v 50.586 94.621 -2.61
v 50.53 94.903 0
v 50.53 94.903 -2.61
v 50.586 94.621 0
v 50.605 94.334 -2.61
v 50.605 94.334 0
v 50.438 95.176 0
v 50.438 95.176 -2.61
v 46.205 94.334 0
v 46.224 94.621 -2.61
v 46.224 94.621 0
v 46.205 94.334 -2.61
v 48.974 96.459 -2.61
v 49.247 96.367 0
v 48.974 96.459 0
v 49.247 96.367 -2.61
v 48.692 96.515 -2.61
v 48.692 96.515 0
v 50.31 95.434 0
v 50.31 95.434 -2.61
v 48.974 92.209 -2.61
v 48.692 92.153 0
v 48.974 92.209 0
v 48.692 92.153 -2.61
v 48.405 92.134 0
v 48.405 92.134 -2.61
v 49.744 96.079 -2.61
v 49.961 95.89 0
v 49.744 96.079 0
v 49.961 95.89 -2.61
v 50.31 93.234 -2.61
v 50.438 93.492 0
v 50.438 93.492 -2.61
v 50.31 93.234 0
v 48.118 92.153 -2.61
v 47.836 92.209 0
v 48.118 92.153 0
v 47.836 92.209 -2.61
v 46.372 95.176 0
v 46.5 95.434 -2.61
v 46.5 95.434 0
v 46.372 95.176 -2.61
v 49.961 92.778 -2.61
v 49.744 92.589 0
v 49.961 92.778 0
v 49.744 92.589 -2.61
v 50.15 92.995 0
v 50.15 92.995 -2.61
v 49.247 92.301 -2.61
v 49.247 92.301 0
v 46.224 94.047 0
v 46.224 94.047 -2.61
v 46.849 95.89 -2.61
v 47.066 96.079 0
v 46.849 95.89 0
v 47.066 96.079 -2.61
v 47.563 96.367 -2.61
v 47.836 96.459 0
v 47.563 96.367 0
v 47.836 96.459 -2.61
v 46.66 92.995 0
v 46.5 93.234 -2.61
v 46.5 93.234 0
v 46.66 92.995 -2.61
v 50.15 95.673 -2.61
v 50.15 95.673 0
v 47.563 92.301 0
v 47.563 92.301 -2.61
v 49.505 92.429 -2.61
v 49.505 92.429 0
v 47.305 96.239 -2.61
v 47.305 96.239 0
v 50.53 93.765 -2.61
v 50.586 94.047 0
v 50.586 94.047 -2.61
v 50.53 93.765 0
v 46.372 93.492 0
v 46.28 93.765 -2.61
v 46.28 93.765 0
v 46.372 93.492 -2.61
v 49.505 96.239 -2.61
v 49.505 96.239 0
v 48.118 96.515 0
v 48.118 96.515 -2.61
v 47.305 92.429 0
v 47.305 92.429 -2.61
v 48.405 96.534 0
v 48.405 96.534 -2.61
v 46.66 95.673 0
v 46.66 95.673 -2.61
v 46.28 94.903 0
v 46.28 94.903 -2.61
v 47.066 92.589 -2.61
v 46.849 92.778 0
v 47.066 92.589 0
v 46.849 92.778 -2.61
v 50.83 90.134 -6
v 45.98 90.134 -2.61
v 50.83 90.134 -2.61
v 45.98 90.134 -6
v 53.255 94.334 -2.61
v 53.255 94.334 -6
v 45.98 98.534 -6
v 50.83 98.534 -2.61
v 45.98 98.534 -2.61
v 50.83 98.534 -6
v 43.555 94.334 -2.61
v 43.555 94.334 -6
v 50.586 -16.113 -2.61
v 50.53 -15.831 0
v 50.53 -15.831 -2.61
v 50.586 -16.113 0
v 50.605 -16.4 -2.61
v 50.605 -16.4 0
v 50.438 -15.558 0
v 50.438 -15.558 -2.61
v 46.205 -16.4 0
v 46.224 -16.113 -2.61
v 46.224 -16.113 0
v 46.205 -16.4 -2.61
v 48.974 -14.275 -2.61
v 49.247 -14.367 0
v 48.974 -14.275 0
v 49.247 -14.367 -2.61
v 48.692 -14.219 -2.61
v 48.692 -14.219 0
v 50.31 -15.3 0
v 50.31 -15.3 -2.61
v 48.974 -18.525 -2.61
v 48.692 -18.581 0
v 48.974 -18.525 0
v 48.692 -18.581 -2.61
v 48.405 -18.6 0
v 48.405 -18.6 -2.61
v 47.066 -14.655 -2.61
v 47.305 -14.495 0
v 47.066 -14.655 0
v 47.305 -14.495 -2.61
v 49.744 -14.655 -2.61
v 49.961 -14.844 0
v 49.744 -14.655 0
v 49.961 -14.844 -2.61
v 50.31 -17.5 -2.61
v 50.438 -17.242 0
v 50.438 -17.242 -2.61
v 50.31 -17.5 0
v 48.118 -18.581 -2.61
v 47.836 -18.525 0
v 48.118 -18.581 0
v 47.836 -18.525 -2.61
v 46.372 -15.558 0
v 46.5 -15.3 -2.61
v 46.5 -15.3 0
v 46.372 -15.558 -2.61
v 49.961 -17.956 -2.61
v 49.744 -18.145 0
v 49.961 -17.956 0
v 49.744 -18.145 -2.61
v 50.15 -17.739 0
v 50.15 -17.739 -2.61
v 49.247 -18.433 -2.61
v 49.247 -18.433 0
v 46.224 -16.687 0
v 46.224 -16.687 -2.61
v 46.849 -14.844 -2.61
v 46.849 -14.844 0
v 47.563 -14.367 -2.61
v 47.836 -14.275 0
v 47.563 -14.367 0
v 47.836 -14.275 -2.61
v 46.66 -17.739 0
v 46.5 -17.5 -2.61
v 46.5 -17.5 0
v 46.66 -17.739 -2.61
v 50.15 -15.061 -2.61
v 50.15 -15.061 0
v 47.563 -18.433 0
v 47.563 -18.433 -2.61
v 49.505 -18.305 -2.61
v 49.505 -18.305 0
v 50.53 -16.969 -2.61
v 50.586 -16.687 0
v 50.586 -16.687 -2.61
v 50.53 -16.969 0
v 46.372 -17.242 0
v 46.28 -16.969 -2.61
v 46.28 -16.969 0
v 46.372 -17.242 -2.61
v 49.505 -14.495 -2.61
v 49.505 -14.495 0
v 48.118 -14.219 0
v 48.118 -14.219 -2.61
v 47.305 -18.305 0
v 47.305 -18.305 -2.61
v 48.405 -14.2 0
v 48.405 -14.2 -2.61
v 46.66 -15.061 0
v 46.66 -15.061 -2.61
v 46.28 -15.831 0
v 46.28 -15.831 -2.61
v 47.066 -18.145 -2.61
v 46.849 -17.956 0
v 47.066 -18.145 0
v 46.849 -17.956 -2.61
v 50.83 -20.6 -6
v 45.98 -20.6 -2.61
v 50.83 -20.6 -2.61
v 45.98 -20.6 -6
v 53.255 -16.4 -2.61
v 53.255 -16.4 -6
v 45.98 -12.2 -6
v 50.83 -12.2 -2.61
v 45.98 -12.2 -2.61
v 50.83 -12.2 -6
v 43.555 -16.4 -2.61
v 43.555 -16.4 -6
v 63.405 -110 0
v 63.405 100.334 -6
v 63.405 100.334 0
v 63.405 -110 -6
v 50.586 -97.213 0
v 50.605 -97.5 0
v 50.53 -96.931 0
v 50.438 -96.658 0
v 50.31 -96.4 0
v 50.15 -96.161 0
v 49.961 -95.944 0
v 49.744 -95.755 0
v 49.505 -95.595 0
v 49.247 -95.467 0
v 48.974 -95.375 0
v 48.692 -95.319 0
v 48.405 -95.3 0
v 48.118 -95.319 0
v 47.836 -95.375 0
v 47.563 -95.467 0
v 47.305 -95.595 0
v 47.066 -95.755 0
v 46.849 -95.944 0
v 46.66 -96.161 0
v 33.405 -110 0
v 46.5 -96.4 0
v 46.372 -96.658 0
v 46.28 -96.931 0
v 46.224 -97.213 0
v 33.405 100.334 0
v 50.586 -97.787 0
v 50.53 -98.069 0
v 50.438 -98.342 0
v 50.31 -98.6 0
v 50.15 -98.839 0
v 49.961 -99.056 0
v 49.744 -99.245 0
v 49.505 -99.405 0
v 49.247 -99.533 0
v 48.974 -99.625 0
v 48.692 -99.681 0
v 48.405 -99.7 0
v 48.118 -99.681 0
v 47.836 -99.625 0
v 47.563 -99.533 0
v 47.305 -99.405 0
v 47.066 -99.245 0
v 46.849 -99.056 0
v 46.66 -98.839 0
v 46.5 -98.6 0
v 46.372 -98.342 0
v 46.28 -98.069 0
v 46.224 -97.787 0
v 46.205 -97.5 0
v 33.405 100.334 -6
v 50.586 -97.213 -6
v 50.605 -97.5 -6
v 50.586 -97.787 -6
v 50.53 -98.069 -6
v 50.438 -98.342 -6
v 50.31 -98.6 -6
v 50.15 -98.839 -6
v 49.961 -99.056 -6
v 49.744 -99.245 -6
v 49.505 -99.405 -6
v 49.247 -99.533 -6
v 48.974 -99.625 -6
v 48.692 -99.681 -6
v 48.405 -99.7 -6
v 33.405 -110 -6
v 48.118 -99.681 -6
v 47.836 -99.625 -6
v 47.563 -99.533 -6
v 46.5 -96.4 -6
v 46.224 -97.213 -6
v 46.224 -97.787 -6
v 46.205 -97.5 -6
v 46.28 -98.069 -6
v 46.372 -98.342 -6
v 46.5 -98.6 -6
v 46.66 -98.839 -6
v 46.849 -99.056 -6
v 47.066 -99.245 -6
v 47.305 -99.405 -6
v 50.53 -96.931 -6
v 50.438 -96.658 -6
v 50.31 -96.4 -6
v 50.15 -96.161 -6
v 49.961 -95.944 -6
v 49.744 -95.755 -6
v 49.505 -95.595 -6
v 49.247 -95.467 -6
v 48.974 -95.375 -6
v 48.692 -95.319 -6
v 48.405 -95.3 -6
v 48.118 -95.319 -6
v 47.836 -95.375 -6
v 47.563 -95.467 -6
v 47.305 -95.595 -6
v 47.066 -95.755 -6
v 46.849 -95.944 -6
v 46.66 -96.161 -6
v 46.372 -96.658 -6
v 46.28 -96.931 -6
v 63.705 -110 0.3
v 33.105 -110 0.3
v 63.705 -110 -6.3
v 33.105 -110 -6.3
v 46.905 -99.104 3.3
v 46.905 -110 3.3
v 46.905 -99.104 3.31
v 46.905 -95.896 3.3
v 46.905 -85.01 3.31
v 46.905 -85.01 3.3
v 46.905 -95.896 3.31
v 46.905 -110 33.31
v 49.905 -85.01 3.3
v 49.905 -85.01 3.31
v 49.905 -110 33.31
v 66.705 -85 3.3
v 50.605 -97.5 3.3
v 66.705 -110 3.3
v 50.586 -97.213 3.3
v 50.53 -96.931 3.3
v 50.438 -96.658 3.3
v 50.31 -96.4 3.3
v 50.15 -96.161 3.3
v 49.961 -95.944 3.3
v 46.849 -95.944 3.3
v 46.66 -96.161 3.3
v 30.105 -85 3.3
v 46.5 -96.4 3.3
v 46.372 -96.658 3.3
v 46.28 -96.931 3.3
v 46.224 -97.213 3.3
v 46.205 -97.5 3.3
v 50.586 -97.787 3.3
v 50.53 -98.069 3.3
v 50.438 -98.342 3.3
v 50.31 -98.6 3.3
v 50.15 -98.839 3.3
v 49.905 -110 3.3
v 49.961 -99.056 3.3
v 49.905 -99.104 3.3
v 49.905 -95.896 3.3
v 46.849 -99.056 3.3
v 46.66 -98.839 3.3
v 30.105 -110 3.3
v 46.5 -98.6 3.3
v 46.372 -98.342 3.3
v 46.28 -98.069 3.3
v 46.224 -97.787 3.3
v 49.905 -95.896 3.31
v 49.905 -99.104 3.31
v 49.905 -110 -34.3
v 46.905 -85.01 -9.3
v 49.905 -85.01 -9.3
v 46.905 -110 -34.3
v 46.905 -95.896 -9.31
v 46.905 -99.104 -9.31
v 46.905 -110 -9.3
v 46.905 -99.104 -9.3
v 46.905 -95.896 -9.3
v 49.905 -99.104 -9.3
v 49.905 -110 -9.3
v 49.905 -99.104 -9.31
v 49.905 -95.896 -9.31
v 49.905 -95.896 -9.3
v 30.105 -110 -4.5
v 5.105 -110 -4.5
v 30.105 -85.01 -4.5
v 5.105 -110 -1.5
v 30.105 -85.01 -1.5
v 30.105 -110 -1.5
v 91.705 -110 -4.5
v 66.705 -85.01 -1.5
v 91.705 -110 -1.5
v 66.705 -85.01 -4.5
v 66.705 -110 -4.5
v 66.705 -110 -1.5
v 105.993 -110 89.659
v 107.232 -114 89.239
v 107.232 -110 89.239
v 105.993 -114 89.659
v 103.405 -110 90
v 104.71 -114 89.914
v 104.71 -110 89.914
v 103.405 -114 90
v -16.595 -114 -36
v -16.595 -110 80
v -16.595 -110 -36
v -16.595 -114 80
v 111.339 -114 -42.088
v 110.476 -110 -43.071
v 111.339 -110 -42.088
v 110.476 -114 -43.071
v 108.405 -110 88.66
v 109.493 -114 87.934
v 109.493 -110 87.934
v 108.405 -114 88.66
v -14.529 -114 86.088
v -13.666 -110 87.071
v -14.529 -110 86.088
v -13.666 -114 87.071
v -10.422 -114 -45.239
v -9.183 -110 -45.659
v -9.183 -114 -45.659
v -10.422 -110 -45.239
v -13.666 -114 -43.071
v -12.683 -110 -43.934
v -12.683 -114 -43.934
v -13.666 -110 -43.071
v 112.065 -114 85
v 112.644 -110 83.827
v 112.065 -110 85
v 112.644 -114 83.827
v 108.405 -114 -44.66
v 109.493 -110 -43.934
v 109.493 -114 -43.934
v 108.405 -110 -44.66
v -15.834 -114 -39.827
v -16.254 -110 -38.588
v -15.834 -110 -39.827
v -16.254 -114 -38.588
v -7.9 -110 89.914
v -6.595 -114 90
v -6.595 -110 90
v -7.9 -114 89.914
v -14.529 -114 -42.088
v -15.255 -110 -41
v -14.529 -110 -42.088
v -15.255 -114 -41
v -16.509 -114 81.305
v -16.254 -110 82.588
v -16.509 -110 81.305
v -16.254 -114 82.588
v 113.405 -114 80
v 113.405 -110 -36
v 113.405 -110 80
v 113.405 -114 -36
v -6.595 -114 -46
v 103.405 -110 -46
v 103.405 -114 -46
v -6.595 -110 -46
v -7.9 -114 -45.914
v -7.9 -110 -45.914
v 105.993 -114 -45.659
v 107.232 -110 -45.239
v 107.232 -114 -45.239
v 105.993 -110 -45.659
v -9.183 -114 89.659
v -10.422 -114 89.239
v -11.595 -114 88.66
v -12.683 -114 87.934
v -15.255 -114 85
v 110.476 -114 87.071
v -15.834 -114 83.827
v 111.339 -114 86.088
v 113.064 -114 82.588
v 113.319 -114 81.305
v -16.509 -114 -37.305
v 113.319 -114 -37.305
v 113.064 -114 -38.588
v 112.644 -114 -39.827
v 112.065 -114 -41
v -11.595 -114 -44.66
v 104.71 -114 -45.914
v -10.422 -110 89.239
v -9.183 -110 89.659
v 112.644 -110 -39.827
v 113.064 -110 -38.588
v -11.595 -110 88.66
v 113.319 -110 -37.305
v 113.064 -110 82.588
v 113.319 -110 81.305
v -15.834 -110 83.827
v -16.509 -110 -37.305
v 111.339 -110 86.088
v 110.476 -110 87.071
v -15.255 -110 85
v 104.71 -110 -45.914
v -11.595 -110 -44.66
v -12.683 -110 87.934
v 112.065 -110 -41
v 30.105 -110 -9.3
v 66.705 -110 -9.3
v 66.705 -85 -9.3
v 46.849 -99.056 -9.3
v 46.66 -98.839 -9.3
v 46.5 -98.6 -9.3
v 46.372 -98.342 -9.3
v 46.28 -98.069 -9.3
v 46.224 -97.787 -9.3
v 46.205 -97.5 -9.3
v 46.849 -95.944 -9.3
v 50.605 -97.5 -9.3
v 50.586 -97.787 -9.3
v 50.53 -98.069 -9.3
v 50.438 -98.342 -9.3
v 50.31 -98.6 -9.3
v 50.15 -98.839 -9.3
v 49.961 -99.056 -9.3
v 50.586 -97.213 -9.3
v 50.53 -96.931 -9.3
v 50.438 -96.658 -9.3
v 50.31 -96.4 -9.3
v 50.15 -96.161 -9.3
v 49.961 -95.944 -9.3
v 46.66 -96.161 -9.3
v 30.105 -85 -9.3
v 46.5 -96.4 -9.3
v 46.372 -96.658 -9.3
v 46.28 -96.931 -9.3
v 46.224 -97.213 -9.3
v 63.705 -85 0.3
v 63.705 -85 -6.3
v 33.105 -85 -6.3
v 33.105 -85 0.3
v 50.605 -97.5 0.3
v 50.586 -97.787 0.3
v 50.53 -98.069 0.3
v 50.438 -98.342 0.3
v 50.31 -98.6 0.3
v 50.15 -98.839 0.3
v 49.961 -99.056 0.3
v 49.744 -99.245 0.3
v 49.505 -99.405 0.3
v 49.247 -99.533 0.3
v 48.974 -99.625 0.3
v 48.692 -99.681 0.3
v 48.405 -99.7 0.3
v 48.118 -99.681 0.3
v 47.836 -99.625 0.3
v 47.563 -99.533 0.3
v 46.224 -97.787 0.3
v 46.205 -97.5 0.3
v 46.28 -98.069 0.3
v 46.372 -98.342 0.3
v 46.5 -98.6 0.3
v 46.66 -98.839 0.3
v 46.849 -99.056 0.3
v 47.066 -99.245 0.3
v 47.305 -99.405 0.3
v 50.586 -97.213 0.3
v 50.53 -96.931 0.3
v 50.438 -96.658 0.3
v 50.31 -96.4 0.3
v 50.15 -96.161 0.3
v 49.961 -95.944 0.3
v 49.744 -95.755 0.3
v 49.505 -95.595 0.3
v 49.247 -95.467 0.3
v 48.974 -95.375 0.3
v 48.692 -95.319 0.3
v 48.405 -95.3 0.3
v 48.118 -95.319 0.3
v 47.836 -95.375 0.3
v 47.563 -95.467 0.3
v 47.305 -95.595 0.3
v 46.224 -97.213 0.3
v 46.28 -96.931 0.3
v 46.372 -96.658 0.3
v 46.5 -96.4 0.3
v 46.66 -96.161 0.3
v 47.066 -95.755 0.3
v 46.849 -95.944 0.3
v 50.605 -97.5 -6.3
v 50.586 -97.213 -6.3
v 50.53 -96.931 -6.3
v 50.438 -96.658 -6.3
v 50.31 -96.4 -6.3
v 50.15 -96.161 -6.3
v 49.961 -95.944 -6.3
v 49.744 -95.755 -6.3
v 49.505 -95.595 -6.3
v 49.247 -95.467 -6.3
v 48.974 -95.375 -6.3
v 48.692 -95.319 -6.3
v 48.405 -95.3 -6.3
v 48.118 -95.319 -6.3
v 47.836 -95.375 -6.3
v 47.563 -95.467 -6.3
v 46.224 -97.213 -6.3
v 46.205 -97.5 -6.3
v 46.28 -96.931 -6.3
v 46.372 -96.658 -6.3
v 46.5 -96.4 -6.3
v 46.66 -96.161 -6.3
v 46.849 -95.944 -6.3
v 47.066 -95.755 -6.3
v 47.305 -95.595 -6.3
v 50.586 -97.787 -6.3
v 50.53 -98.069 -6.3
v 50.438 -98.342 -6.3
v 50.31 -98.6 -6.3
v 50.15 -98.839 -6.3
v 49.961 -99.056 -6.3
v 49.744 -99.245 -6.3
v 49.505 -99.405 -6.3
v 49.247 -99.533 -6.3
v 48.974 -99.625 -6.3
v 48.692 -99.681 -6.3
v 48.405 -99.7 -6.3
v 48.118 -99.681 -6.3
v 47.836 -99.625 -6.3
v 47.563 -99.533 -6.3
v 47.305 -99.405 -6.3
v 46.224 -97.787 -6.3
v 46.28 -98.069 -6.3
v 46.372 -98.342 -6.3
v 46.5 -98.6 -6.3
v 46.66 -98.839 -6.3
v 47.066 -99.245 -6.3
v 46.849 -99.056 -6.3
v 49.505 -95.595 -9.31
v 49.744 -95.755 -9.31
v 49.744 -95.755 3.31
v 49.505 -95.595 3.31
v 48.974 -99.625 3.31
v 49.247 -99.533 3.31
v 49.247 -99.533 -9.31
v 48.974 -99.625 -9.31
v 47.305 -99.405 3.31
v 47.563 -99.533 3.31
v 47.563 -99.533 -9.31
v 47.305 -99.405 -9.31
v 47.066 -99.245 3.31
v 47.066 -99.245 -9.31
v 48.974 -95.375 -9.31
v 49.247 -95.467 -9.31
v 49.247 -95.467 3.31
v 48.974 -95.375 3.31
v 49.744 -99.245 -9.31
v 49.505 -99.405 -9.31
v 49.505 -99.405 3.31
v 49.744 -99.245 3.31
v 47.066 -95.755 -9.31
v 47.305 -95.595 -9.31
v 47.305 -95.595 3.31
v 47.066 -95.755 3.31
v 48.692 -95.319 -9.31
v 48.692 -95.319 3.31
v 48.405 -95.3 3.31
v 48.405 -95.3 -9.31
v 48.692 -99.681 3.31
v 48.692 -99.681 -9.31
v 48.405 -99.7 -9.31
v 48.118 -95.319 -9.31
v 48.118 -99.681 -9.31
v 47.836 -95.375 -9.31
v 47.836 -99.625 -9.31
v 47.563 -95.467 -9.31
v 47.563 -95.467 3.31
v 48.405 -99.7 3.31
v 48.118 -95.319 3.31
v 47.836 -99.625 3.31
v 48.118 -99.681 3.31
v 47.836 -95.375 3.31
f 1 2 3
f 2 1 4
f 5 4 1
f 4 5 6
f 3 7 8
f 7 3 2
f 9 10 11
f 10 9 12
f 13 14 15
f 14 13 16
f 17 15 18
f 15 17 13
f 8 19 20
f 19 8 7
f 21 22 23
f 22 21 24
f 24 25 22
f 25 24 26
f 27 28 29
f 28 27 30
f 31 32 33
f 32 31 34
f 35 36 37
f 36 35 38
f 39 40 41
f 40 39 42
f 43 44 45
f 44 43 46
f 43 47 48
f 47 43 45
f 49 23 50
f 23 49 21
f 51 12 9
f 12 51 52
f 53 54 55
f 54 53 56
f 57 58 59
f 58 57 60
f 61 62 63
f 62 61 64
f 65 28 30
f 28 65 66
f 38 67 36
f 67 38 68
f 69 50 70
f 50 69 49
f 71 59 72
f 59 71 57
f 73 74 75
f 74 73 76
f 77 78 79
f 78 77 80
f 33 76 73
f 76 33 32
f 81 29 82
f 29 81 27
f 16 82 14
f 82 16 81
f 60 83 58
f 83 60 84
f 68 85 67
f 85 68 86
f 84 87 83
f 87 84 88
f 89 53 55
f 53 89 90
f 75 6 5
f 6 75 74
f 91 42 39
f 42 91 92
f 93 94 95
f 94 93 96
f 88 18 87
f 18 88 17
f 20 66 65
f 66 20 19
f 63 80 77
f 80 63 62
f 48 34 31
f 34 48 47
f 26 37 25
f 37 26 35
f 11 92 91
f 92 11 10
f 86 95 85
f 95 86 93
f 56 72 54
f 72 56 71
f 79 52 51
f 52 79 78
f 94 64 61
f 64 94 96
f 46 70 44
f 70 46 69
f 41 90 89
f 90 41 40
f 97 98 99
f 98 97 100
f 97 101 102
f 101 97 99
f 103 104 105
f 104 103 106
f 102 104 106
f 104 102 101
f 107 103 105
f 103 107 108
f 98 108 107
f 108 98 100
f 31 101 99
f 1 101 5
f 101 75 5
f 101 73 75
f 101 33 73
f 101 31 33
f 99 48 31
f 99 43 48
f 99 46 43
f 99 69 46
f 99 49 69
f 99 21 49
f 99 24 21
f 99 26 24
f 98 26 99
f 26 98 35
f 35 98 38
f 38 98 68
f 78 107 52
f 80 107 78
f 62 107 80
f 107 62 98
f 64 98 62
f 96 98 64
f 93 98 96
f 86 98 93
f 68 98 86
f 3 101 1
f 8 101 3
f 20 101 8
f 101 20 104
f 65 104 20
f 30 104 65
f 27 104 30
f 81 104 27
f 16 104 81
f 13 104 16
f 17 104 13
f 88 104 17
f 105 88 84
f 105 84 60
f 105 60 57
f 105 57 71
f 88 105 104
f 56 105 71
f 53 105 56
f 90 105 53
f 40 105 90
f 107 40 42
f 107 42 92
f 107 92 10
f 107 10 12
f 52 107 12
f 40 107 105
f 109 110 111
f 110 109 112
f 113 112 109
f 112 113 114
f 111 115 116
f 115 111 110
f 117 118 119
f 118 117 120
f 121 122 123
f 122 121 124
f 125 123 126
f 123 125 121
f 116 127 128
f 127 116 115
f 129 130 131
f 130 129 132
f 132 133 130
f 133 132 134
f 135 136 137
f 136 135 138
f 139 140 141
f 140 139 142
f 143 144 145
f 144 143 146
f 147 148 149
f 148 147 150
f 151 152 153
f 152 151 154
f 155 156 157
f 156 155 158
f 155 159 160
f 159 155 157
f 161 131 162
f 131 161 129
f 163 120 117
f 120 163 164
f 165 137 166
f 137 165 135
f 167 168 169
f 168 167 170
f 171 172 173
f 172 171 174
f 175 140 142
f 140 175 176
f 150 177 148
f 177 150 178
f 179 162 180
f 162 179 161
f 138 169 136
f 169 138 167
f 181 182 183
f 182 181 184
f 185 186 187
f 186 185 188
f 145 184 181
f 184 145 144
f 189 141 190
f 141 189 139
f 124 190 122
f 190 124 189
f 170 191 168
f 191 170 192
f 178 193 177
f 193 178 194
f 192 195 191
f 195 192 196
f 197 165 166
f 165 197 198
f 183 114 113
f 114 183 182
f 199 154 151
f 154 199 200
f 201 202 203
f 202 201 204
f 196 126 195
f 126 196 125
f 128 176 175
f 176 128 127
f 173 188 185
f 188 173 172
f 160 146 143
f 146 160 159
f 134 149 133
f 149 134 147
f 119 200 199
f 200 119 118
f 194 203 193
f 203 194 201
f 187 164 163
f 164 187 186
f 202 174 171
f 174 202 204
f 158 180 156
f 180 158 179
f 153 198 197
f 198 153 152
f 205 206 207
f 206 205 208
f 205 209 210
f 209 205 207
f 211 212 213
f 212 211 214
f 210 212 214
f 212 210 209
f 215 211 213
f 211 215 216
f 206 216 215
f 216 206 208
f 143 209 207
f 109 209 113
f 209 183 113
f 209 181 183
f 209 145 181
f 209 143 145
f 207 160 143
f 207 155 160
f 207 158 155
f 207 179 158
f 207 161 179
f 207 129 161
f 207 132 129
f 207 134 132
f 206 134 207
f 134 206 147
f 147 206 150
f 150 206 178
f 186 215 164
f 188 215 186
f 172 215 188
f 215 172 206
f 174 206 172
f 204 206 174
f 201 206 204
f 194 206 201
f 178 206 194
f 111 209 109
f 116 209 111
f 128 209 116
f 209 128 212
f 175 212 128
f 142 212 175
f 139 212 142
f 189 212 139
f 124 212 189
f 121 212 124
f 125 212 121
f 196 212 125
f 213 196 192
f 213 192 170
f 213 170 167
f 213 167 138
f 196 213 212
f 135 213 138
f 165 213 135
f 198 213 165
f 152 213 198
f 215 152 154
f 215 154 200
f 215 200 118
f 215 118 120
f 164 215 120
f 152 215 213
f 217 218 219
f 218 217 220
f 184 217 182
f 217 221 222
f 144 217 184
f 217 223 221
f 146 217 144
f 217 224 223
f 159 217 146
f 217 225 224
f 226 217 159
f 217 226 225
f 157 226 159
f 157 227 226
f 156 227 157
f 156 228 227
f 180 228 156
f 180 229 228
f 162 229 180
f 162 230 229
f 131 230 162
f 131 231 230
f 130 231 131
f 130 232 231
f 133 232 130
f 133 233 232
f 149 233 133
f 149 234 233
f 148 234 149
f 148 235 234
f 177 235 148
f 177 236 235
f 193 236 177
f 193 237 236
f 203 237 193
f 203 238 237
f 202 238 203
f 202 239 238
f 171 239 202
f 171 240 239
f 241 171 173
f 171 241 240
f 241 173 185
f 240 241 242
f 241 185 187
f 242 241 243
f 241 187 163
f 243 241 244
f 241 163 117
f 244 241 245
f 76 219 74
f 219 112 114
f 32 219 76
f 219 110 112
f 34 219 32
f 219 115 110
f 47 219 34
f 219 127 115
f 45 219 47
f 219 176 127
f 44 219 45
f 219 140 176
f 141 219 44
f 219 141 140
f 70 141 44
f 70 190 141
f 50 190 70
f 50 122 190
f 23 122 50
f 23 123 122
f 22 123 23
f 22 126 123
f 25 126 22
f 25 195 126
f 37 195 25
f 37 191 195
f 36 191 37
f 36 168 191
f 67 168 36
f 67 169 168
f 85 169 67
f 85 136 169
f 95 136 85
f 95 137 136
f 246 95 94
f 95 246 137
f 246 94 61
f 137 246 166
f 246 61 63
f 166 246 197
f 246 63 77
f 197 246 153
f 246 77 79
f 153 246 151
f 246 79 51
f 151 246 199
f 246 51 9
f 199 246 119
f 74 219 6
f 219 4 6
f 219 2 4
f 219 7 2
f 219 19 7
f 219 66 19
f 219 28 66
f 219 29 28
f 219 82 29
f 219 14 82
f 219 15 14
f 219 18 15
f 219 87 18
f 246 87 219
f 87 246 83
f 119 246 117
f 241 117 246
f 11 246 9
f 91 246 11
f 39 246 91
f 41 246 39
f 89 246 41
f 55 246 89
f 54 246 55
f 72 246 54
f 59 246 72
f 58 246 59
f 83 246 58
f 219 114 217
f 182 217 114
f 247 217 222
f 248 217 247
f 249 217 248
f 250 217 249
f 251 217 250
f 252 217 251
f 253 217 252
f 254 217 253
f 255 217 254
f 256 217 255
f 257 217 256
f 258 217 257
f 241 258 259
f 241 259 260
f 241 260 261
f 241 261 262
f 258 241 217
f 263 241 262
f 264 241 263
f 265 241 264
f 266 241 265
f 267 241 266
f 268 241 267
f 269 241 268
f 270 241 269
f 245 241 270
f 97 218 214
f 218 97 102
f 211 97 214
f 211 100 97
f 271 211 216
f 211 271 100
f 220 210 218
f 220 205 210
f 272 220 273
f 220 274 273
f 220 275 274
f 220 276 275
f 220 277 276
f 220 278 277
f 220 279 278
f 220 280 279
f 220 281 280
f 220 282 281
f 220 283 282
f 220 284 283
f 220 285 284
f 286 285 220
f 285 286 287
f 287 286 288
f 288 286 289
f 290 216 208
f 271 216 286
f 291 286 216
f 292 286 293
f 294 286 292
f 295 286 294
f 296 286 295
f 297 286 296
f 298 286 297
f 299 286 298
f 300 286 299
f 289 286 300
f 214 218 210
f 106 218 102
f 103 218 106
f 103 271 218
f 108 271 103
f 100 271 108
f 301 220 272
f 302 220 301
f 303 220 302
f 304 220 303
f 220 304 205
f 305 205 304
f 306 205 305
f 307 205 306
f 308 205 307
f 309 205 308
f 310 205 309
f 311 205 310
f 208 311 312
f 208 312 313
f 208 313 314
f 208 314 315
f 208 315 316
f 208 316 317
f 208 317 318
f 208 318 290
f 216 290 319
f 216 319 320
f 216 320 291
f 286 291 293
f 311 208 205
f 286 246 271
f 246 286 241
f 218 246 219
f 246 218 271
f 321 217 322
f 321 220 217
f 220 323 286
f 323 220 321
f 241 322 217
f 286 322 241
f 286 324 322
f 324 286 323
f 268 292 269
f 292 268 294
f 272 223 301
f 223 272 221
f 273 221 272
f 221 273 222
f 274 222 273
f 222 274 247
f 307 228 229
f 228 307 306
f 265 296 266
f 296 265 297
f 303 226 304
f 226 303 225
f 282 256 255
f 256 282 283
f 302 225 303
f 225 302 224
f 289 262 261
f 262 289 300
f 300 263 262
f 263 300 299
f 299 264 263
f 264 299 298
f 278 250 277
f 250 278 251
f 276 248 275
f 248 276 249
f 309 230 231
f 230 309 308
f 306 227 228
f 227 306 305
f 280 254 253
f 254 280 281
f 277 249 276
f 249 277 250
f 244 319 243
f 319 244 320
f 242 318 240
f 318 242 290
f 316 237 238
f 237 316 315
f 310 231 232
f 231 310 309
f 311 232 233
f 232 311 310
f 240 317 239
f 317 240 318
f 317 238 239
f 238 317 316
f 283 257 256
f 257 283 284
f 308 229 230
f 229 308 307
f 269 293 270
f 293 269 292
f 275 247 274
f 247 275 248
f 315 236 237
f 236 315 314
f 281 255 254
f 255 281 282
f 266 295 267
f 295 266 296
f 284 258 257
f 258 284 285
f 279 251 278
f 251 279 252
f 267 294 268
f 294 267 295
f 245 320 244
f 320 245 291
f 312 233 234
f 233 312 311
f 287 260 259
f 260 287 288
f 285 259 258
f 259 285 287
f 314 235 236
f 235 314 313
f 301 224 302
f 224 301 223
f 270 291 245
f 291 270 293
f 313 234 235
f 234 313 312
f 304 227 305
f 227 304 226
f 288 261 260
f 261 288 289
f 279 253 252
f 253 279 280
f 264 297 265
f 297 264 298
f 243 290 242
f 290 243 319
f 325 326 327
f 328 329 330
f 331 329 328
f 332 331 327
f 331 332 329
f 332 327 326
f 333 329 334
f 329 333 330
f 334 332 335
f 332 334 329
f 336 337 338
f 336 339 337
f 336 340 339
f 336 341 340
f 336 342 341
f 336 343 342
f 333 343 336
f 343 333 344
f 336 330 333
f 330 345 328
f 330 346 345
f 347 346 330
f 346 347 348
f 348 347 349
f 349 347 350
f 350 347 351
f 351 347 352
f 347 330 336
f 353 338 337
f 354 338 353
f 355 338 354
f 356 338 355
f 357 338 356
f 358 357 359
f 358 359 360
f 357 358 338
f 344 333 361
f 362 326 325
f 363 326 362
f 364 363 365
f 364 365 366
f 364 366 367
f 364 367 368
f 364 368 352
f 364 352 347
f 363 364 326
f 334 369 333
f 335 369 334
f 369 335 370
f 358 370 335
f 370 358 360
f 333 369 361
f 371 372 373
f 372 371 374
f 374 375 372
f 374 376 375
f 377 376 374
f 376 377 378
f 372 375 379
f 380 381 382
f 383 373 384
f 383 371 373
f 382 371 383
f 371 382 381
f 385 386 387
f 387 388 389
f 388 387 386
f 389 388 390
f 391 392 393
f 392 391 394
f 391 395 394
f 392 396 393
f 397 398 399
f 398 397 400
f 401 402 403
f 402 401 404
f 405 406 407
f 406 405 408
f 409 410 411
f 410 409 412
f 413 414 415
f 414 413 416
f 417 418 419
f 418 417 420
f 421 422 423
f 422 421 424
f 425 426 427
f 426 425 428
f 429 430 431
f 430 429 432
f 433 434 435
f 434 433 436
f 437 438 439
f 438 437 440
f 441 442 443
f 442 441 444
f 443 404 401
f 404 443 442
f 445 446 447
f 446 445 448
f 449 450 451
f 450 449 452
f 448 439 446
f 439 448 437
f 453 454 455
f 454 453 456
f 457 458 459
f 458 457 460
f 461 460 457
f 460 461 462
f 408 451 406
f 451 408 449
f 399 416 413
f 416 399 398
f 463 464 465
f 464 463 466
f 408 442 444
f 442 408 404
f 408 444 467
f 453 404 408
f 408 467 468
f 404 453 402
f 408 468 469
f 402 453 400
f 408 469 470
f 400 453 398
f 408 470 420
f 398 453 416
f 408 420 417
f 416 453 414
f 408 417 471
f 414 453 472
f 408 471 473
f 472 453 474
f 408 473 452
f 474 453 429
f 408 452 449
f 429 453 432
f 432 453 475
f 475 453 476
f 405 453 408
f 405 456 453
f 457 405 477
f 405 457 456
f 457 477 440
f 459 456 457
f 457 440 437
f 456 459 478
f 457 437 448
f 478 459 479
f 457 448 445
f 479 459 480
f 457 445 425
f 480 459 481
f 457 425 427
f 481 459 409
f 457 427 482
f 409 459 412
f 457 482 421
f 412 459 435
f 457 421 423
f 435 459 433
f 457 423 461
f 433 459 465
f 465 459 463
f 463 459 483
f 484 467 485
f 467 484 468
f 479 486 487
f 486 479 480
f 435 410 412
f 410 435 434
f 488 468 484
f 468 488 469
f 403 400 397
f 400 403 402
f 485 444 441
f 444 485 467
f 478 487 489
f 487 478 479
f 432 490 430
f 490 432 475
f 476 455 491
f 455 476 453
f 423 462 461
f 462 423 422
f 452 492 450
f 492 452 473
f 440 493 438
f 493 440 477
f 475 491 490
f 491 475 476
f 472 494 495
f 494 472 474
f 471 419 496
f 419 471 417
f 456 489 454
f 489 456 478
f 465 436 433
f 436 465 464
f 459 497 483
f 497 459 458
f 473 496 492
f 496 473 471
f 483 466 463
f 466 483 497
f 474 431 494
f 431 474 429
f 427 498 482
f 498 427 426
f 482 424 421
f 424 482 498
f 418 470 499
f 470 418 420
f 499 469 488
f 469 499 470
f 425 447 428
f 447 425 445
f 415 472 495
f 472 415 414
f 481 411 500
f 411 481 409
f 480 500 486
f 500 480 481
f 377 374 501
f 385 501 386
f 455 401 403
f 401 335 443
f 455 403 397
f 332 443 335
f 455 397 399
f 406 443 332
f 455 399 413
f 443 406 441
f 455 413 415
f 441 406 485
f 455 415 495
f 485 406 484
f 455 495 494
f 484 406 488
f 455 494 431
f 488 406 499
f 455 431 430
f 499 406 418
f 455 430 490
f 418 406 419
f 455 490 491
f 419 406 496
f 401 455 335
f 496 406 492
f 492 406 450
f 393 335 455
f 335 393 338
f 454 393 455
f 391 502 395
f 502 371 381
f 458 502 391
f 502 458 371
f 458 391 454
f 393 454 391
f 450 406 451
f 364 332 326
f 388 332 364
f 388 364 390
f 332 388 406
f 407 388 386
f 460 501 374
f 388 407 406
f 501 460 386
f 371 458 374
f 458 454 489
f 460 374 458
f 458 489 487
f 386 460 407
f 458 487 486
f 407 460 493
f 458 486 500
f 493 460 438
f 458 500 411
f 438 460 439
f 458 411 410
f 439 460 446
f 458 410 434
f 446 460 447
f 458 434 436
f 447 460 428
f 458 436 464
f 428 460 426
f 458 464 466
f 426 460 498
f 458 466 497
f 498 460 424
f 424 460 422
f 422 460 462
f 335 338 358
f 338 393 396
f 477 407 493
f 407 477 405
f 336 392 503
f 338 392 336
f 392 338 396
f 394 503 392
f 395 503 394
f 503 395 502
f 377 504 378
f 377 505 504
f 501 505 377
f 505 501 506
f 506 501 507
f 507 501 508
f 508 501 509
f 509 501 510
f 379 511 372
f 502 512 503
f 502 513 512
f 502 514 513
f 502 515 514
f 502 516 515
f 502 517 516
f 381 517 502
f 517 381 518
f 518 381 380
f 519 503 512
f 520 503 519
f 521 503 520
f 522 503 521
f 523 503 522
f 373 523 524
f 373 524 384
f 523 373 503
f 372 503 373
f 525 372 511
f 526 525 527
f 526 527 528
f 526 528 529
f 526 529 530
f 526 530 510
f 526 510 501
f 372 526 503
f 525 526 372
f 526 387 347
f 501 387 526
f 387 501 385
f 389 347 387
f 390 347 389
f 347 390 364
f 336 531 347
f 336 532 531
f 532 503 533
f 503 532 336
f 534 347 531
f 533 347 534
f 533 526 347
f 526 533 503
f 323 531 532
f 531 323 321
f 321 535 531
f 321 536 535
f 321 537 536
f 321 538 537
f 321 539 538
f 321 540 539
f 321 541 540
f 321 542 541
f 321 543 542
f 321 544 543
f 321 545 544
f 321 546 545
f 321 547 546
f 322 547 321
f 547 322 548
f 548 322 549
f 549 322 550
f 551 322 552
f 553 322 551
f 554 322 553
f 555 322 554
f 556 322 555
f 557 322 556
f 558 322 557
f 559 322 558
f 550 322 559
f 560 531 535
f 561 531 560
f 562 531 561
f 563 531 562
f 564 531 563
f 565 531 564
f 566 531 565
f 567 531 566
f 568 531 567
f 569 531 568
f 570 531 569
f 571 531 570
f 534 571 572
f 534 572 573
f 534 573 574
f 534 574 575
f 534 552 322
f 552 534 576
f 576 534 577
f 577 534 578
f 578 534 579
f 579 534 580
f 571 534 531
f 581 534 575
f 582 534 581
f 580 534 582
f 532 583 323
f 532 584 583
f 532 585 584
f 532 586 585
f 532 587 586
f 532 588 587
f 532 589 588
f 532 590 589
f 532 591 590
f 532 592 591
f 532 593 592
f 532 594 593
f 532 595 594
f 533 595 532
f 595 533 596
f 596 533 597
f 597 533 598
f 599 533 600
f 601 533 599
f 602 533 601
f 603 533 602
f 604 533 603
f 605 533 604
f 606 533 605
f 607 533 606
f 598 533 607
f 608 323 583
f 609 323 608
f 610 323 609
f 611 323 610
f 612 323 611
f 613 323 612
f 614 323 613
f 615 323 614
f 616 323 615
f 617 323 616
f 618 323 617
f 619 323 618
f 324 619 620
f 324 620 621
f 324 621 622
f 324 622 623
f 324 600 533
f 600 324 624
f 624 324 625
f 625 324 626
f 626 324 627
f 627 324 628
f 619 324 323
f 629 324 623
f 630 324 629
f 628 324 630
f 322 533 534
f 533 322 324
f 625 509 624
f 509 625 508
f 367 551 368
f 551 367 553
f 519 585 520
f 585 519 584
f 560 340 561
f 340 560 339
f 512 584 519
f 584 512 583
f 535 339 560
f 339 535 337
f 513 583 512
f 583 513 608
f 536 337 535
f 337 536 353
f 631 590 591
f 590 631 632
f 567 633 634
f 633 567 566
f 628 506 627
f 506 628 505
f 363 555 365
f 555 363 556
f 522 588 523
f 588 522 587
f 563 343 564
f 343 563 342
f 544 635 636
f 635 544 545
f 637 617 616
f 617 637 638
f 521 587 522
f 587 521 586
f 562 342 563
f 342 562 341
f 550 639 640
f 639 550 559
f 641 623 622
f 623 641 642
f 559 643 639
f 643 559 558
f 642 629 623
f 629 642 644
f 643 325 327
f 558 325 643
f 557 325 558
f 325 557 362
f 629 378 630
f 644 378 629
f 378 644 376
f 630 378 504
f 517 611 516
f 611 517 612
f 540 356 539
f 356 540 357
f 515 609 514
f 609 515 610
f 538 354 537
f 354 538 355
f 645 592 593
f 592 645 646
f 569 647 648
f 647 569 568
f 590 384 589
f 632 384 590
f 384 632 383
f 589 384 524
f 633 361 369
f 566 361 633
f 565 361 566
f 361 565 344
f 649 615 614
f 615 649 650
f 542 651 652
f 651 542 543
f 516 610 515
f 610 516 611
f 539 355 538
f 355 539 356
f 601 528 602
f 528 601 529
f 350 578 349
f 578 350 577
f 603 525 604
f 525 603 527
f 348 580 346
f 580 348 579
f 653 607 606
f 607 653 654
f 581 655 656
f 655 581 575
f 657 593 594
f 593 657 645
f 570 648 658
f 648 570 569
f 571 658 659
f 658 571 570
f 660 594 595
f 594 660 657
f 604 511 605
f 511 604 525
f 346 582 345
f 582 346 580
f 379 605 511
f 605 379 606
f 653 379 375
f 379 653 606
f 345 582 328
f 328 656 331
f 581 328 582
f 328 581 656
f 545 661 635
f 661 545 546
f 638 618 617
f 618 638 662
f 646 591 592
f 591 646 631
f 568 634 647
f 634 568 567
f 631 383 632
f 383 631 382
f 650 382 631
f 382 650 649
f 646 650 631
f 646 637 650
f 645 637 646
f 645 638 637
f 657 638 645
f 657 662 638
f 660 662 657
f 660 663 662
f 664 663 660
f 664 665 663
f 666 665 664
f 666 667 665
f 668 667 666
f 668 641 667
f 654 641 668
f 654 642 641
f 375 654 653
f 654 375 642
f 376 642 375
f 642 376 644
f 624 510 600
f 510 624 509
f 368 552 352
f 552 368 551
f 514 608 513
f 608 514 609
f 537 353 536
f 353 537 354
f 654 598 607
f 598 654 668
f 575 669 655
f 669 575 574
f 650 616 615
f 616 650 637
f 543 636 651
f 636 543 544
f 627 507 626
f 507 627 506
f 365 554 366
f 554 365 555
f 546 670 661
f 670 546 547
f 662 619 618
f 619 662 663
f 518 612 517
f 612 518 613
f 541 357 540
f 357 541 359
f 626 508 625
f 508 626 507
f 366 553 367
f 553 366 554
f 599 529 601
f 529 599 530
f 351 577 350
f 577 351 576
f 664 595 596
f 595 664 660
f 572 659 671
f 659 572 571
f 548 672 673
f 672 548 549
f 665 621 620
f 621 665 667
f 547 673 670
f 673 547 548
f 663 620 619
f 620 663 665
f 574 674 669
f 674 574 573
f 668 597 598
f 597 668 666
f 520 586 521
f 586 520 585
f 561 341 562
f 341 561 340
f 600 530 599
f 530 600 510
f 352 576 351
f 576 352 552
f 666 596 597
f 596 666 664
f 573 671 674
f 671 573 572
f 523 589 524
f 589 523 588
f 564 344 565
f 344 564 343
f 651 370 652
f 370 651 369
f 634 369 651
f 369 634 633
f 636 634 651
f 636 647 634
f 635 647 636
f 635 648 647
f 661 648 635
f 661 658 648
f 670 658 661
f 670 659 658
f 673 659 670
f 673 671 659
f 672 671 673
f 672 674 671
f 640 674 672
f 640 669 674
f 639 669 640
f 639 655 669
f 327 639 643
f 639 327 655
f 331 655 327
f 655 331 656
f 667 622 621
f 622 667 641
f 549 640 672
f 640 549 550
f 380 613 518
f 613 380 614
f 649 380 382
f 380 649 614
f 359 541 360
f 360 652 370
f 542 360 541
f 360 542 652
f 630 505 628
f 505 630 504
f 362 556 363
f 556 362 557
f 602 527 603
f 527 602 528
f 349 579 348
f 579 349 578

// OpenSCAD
// Table stand: box + clipped radiation shield, standing on a table.
// Units: mm. Material: PETG.
//
// The mast stands in for the wall: the box screws onto it by its two wall tabs
// (M4 countersunk + nuts sunk in the back of the mast), the shield stays clipped under
// the bottom tab as on the wall. The mast fits into the foot (1 M4 screw).
//
// Parts (printable without support):
//   mast: mast, flat, back on the bed                      x1
//   foot: foot with socket, underside on the bed            x1
// Export:
//   openscad -D 'part="mast"' -o stand_mast.3mf stand.scad
//   openscad -D 'part="foot"' -o stand_foot.3mf stand.scad
//
// Frame = the one of tinysensor_box.scad (X right, Y up, Z out of the wall, wall at Z = 0).

/* [Render] */
part = "assembly"; // [mast, foot, assembly]

/* [Copied from tinysensor_box.scad / sensor_shield.scad — keep aligned] */
cav_w = 96.81;
ear_top = 100.334;              // end of the top tab (cav_h + wall + flange + ear_l)
ear_holes_y = [94.334, -16.4];  // axes of the tabs' wall screw holes
shield_bottom = -80;            // underside of the clipped shield (oy of assembly.scad)
shield_front = 72;              // front of the shield (wall_y + clip_t + plate_d / 2)

/* [Mast] */
mast_w = 30;
mast_t = 6;
under_clr = 30;    // clearance under the shield: loop of the cable coming up through the base

/* [Foot] */
foot_w = 130;      // width (X)
foot_back = 40;    // overhang behind the mast
foot_front = 90;   // overhang in front of the wall (the shield reaches shield_front)
foot_t = 4;
foot_r = 10;
socket_h = 25;     // mast insertion depth
socket_wall = 3;
fit = 0.3;         // mast / socket clearance
gusset_t = 3;

/* [Screws] */
screw_d = 4.4;     // M4
nut_af = 8.4;      // M4 nut (7.9 across flats + clearance)
nut_h = 3.4;

$fn = 48;
eps = 0.01;

cx = cav_w / 2;
y_bot = shield_bottom - under_clr;   // mast bottom = top of the foot
y_floor = y_bot - foot_t;             // table
mast_l = ear_top - y_bot;
socket_screw_y = y_bot + socket_h / 2;

module mast_use() {
  difference() {
    translate([cx - mast_w / 2, y_bot, -mast_t]) cube([mast_w, mast_l, mast_t]);
    // box tab screws, nuts sunk in the back
    for (y = ear_holes_y) translate([cx, y, -mast_t - eps]) {
      cylinder(d = screw_d, h = mast_t + 2 * eps);
      cylinder(d = nut_af / cos(30), h = nut_h, $fn = 6);
    }
    // socket screw
    translate([cx, socket_screw_y, -mast_t - eps]) cylinder(d = screw_d, h = mast_t + 2 * eps);
  }
}

module foot_use() {
  sx = mast_w / 2 + fit + socket_wall;   // outer half-width of the socket
  z0 = -mast_t - fit - socket_wall;      // back of the socket
  z1 = fit + socket_wall;                // front face of the socket
  difference() {
    union() {
      // foot
      translate([0, y_floor, 0]) rotate([-90, 0, 0]) linear_extrude(foot_t)
        translate([cx - foot_w / 2, -foot_front]) offset(r = foot_r) offset(delta = -foot_r)
          square([foot_w, foot_front + mast_t + foot_back]);
      // socket
      translate([cx - sx, y_bot - eps, z0]) cube([2 * sx, socket_h + eps, z1 - z0]);
      // front / rear gussets (YZ plane) and side ones (XY plane)
      for (g = [[z1, z1 + 30], [z0, z0 - 25]])
        hull() {
          translate([cx - gusset_t / 2, y_bot - eps, g[0]]) cube([gusset_t, socket_h, eps]);
          translate([cx - gusset_t / 2, y_bot - eps, g[1]]) cube([gusset_t, eps, eps]);
        }
      for (s = [-1, 1])
        hull() {
          translate([cx + s * sx - (s > 0 ? eps : 0), y_bot - eps, -mast_t / 2 - gusset_t / 2]) cube([eps, socket_h, gusset_t]);
          translate([cx + s * (sx + 25) - (s > 0 ? eps : 0), y_bot - eps, -mast_t / 2 - gusset_t / 2]) cube([eps, eps, gusset_t]);
        }
    }
    // mast pocket
    translate([cx - mast_w / 2 - fit, y_bot, -mast_t - fit]) cube([mast_w + 2 * fit, socket_h + eps, mast_t + 2 * fit]);
    // through screw M4 x 20 + nut
    translate([cx, socket_screw_y, z0 - eps]) cylinder(d = screw_d, h = z1 - z0 + 2 * eps);
  }
}

if (part == "mast") translate([0, 0, mast_t]) mast_use();          // back on the bed
else if (part == "foot") translate([0, 0, -y_floor]) rotate([90, 0, 0]) foot_use(); // use Y -> Z
else {
  color("Peru") mast_use();
  color("Sienna") foot_use();
}
